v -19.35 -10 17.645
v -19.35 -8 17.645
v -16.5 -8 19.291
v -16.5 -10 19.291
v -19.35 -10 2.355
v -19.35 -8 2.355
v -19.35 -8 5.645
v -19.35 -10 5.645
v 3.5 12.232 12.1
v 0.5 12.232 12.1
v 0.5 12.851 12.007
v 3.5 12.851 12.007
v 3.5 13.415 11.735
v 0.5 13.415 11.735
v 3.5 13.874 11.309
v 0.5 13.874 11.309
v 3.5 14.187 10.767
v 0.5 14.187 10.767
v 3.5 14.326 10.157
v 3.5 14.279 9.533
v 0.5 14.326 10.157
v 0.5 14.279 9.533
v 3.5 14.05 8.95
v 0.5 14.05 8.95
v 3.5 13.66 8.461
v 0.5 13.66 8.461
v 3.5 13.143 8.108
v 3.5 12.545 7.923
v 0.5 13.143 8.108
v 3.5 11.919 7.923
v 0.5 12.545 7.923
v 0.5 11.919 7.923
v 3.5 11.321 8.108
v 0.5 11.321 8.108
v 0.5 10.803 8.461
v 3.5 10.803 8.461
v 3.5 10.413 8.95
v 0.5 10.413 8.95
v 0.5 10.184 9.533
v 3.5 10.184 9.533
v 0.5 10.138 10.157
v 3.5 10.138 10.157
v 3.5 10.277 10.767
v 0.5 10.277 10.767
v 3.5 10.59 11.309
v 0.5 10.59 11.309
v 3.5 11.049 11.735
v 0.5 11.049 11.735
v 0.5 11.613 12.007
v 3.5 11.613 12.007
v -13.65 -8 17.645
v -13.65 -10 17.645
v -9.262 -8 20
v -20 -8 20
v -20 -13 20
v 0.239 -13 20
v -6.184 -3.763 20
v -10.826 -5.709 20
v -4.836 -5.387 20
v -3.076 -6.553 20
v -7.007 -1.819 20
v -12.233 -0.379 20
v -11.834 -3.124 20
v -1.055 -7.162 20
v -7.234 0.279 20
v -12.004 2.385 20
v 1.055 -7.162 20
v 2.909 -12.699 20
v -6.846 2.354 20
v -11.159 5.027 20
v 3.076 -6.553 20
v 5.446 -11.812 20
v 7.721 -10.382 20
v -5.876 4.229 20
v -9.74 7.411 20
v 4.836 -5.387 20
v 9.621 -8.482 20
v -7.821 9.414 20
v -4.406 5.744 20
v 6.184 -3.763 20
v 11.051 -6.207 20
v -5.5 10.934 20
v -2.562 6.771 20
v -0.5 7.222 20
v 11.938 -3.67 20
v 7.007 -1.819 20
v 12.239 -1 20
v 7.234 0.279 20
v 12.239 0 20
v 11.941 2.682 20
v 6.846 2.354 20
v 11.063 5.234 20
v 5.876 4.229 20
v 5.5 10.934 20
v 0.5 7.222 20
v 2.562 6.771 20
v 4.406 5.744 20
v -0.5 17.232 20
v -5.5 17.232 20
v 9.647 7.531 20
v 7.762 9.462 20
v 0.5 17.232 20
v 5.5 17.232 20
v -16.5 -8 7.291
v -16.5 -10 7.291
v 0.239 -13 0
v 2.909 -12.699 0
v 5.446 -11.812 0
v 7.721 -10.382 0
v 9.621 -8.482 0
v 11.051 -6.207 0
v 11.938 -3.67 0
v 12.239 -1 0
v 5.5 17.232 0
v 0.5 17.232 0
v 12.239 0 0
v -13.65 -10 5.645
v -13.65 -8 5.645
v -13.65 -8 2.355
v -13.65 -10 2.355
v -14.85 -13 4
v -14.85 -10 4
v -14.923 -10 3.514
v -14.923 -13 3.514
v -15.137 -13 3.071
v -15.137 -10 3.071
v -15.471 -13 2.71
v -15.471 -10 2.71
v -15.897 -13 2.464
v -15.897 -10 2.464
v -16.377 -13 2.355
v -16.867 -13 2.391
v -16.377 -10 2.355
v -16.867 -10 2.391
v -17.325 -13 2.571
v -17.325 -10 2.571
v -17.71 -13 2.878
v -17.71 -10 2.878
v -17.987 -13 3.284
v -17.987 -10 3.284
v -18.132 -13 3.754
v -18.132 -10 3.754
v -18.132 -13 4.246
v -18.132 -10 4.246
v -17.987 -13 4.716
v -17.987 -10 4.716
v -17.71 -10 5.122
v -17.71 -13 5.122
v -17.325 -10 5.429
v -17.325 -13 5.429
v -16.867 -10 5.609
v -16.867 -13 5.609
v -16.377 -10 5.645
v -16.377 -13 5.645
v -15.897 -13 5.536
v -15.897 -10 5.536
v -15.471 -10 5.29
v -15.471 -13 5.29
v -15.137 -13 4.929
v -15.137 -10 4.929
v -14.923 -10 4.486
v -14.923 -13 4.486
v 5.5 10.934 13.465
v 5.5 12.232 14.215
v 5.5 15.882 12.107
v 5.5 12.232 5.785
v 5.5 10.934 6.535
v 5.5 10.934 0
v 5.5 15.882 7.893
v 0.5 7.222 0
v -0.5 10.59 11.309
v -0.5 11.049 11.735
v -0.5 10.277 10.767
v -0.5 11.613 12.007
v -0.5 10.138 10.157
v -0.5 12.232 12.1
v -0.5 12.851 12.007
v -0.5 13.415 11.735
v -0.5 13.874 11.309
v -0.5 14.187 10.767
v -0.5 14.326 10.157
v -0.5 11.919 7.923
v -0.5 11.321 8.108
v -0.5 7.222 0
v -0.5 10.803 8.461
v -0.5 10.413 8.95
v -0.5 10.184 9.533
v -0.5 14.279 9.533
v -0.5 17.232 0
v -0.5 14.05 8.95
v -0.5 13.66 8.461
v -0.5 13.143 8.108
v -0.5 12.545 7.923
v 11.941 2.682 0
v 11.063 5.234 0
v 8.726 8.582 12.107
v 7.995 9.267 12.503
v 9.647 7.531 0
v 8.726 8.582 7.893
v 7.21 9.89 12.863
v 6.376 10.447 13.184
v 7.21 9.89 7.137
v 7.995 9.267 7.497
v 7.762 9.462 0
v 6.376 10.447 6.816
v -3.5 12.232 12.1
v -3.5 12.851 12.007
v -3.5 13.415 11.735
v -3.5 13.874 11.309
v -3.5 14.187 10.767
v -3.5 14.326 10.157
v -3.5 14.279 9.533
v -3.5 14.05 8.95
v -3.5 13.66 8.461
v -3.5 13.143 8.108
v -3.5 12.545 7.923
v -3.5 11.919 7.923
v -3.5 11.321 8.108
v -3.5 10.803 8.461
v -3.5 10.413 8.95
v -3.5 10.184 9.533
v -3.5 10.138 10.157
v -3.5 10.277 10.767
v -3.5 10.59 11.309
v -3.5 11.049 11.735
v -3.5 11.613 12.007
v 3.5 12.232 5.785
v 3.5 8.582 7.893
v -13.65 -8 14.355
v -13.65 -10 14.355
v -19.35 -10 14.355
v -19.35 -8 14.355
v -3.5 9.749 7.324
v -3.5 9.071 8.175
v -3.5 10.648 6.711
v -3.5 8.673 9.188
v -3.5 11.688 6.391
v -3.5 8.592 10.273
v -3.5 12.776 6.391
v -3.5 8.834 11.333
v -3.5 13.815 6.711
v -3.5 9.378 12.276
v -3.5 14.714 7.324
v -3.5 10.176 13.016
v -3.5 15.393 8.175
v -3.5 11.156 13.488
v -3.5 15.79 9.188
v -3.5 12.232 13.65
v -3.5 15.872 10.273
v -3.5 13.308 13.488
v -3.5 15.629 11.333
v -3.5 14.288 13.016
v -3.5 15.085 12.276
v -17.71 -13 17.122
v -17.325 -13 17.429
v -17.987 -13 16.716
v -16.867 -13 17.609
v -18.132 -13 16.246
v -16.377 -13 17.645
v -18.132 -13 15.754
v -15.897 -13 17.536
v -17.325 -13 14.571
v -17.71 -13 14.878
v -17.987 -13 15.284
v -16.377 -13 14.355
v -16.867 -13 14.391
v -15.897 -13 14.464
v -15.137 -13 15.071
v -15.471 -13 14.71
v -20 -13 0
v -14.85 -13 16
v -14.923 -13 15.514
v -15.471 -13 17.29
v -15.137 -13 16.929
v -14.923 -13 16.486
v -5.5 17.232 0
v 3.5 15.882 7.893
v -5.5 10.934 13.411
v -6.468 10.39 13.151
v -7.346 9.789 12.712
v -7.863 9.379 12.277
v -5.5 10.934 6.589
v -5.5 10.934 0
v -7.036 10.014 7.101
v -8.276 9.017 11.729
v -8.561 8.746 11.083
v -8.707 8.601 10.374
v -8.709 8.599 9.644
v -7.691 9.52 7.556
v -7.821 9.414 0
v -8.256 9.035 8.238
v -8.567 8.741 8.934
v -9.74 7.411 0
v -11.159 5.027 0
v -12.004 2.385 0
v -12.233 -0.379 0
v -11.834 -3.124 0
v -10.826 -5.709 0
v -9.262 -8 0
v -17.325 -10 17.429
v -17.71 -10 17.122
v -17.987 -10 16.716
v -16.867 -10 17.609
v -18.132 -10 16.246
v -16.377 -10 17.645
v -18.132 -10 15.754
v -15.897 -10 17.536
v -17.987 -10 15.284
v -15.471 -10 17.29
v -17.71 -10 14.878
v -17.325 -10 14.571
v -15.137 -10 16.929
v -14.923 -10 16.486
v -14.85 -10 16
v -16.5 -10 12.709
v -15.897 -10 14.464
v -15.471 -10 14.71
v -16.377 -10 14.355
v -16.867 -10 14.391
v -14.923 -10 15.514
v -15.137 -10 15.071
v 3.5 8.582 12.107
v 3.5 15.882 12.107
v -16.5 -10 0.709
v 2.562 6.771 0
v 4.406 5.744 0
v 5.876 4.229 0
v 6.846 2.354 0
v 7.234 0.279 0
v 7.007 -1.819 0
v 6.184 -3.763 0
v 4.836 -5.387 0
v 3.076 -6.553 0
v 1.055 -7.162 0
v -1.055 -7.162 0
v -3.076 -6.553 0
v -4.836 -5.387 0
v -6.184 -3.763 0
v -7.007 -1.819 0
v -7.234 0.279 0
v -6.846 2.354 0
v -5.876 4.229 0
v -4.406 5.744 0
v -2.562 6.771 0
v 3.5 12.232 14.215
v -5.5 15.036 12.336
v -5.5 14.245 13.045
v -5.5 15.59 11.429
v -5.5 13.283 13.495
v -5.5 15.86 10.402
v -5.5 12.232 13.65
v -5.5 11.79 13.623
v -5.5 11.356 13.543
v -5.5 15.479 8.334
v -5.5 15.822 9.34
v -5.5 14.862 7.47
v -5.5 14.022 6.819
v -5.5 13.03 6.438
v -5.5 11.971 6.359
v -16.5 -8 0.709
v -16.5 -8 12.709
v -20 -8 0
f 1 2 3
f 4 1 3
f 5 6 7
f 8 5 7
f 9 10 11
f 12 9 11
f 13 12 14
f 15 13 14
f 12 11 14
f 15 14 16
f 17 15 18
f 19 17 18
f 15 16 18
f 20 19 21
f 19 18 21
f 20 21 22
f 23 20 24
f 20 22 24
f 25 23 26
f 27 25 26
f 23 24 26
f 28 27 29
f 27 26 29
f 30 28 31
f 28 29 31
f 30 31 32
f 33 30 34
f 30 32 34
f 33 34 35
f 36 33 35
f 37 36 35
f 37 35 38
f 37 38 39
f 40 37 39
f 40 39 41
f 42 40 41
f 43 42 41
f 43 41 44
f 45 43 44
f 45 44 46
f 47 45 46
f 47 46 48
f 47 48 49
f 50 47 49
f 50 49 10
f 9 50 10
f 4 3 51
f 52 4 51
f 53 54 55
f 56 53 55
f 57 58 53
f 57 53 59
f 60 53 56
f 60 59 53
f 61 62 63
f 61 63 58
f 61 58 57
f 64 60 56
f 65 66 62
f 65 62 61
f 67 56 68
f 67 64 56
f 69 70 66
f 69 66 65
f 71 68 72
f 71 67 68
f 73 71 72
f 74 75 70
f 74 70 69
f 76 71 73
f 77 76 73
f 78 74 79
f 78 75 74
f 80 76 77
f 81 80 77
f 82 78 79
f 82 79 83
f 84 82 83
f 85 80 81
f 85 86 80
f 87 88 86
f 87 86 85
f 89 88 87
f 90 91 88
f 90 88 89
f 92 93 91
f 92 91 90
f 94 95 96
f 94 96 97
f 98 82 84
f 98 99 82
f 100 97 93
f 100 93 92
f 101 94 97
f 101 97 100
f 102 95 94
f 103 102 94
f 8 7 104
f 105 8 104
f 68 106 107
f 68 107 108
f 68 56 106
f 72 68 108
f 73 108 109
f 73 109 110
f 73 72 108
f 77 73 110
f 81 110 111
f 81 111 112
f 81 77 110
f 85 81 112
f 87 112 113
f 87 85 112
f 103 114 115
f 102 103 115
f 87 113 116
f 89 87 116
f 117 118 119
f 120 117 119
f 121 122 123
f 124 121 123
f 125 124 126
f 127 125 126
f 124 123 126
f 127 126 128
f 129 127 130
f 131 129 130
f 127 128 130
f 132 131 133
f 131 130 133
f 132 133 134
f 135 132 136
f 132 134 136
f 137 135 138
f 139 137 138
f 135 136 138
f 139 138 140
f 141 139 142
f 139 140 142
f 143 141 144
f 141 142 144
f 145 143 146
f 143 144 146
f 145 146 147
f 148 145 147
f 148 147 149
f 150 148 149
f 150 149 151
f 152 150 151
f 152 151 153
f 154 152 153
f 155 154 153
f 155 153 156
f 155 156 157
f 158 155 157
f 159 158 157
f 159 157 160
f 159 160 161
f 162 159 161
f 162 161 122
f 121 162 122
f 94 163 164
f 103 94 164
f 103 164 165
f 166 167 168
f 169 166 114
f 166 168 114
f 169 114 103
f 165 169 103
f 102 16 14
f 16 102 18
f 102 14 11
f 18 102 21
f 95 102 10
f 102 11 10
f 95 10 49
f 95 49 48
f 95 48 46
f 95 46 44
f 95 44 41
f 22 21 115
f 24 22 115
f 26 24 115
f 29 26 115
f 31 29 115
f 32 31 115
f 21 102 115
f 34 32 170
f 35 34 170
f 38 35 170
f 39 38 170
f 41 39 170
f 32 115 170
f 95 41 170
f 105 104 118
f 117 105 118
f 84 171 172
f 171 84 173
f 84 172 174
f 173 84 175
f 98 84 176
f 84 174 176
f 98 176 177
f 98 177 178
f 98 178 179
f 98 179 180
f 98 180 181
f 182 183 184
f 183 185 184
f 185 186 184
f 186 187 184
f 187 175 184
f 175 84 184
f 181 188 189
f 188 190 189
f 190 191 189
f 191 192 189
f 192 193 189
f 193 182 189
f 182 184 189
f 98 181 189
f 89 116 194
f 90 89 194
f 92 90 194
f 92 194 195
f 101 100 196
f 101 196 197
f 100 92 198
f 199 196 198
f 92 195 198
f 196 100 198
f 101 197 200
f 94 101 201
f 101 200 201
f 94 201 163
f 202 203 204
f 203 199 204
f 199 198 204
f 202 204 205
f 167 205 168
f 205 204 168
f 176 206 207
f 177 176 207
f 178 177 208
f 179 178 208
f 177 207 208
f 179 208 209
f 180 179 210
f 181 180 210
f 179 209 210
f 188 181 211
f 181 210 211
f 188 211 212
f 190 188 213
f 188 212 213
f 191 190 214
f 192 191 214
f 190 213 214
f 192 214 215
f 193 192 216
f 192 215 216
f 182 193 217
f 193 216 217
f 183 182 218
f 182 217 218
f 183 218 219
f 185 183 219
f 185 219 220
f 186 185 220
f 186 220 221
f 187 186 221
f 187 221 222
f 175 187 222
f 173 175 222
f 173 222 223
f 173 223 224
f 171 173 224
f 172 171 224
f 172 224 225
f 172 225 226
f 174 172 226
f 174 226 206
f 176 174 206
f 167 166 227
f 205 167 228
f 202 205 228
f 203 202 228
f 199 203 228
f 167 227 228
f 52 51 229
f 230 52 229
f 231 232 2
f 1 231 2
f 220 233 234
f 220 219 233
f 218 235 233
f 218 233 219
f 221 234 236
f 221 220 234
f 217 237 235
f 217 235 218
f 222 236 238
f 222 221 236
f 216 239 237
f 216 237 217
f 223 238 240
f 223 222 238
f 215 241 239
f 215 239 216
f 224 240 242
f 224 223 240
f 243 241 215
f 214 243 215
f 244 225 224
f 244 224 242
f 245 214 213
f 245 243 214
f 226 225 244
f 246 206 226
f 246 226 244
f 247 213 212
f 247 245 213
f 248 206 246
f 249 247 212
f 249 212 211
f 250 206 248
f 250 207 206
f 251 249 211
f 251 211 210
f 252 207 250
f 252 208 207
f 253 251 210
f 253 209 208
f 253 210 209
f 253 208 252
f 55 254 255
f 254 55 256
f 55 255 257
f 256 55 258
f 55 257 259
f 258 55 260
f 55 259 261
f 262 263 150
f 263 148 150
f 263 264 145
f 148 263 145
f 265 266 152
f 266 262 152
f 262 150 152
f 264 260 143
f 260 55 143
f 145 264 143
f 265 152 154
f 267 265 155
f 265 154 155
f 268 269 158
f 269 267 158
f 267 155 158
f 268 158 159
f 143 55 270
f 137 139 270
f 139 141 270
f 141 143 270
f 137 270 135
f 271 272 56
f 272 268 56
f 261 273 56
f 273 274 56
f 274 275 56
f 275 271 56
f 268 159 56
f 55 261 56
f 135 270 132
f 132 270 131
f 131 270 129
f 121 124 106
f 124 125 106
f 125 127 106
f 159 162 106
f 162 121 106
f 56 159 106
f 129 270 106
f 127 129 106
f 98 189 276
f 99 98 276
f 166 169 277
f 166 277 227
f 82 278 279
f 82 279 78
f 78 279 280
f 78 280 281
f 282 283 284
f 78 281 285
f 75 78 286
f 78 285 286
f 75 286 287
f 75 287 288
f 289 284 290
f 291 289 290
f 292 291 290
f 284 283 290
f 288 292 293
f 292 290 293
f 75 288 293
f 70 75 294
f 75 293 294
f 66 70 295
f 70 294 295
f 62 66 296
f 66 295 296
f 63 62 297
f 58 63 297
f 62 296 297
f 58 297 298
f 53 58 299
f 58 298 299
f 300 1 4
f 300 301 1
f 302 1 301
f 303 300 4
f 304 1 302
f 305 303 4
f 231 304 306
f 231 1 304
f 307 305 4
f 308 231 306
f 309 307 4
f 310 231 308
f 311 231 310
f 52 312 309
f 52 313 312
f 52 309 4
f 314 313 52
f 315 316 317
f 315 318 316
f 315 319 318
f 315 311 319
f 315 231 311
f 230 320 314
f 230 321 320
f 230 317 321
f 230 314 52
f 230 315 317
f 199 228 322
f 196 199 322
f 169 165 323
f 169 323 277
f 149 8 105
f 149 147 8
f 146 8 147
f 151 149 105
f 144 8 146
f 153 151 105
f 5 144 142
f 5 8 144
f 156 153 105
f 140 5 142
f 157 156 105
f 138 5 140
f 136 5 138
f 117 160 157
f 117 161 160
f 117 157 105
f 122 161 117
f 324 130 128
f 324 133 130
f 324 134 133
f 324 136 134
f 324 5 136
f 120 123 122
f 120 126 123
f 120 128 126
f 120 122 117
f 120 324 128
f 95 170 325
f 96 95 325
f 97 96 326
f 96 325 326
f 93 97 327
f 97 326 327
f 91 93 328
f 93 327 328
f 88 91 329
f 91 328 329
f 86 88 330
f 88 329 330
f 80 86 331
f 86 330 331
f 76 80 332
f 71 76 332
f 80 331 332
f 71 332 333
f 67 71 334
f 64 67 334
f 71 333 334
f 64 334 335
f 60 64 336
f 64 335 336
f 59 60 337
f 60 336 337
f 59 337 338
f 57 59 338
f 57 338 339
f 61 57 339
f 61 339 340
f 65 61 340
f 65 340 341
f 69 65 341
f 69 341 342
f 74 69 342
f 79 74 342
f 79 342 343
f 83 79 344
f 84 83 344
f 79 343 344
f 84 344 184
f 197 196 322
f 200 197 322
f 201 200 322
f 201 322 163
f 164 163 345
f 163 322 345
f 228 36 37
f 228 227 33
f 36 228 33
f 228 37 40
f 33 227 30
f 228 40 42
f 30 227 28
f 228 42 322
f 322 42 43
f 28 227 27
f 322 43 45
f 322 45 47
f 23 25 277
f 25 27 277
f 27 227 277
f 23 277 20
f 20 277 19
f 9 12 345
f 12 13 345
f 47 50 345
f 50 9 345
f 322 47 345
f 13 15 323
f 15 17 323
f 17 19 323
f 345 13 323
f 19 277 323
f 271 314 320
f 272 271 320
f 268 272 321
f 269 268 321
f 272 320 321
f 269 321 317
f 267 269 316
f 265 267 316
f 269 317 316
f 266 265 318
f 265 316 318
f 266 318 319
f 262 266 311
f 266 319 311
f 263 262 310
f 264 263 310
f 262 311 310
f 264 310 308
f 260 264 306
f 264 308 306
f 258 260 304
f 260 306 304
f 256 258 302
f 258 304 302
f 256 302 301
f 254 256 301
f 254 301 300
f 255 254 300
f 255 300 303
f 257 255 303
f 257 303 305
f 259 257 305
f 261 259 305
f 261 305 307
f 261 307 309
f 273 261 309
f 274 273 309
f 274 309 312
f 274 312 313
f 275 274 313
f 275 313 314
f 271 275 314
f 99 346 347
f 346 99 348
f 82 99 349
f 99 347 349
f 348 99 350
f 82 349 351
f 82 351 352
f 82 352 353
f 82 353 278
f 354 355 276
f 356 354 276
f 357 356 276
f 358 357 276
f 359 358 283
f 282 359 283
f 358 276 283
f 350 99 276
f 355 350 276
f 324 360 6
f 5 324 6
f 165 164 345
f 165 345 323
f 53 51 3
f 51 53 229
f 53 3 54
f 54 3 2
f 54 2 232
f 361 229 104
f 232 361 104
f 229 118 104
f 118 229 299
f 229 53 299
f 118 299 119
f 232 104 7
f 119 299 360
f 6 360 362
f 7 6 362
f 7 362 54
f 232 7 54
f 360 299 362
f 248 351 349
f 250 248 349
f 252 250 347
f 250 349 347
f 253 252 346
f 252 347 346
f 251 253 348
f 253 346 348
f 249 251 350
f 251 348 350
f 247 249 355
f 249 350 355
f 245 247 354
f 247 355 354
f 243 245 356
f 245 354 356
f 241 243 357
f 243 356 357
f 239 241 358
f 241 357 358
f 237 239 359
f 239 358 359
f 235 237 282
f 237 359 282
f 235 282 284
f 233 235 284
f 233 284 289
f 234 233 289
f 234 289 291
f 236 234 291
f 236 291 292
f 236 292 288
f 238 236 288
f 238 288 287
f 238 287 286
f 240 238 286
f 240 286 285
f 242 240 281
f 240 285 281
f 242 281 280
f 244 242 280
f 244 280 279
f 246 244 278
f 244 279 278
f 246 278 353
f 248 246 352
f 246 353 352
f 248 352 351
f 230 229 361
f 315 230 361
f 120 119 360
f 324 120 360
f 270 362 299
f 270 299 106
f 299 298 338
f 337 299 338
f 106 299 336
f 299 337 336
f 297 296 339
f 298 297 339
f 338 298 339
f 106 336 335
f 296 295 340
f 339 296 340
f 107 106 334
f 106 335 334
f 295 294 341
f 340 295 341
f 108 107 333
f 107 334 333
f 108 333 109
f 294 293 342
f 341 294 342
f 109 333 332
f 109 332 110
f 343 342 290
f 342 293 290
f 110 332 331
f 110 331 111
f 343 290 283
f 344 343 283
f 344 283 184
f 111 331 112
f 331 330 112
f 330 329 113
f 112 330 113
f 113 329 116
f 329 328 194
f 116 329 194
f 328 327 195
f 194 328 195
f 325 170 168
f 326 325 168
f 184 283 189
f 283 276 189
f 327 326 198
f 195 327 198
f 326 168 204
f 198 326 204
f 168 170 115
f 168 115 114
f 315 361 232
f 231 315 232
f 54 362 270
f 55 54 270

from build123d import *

# Parameters (mm, degrees)
BOSS_EXTRUDE1_DEPTH     = 20
SKETCH2_R               = 2.1
CUT_EXTRUDE1_DEPTH      = 15.5
CUT_EXTRUDE1_DEPTH_BACK = 18.739
SKETCH4_R               = 3.65
CUT_EXTRUDE2_DEPTH      = 15.5
CUT_EXTRUDE2_DEPTH_BACK = 2
CUT_EXTRUDE3_DEPTH      = 7.7390001
CUT_EXTRUDE3_DEPTH_BACK = 2
SKETCH6_R               = 1.65
CUT_EXTRUDE4_DEPTH      = 6
CUT_EXTRUDE5_DEPTH      = 2
FILLET1_R               = 12


with BuildPart() as part:
    # Sketch1 → Boss-Extrude1 (new body)
    with BuildSketch(Plane.XY):
        with BuildLine():
            Line((-0.5, 7.221711778), (-0.5, 17.231747474))
            Line((-0.5, 17.231747474), (-5.5, 17.231747474))
            Line((-5.5, 17.231747474), (-5.5, 10.933577685))
            ThreePointArc((-5.5, 10.933577685), (-12.004275475, 2.385475074), (-9.262457611, -8))
            Line((-9.262457611, -8), (-20, -8))
            Line((-20, -8), (-20, -13))
            Line((-20, -13), (12.239, -13))
            Line((12.239, -13), (12.239, 0))
            ThreePointArc((12.239, 0), (10.418915994, 6.421784059), (5.5, 10.933577685))
            Line((5.5, 10.933577685), (5.5, 17.231747474))
            Line((5.5, 17.231747474), (0.5, 17.231747474))
            Line((0.5, 17.231747474), (0.5, 7.221711778))
            ThreePointArc((0.5, 7.221711778), (0, -7.239), (-0.5, 7.221711778))
        make_face()
    extrude(amount=BOSS_EXTRUDE1_DEPTH)

    # Sketch2 → Cut-Extrude1 (cut, two sides)
    with BuildSketch(Plane.ZY.offset(5.5)) as cut_extrude1_sk:
        with Locations((10, 12.231747474)):
            Circle(SKETCH2_R)
    extrude(amount=CUT_EXTRUDE1_DEPTH, mode=Mode.SUBTRACT)
    extrude(cut_extrude1_sk.sketch, amount=-CUT_EXTRUDE1_DEPTH_BACK, mode=Mode.SUBTRACT)

    # Sketch4 → Cut-Extrude2 (cut, two sides)
    with BuildSketch(Plane.ZY.offset(5.5)) as cut_extrude2_sk:
        with Locations((10, 12.231747474)):
            Circle(SKETCH4_R)
    extrude(amount=CUT_EXTRUDE2_DEPTH, mode=Mode.SUBTRACT)
    extrude(cut_extrude2_sk.sketch, amount=-CUT_EXTRUDE2_DEPTH_BACK, mode=Mode.SUBTRACT)

    # Sketch5 → Cut-Extrude3 (cut, two sides)
    with BuildSketch(Plane(origin=(5.5, 0, 0), x_dir=(0, 0, -1), z_dir=(1, 0, 0))) as cut_extrude3_sk:
        Polygon((-12.107328483, 8.581747474), (-14.214656965, 12.231747474), (-12.107328483, 15.881747474), (-7.892671517, 15.881747474), (-5.785343035, 12.231747474), (-7.892671517, 8.581747474), align=None)
    extrude(amount=CUT_EXTRUDE3_DEPTH, mode=Mode.SUBTRACT)
    extrude(cut_extrude3_sk.sketch, amount=-CUT_EXTRUDE3_DEPTH_BACK, mode=Mode.SUBTRACT)

    # Sketch6 → Cut-Extrude4 (cut, through all)
    with BuildSketch(Plane(origin=(0, -8, 0), x_dir=(1, 0, 0), z_dir=(0, 1, 0))):
        with Locations((-16.5, -4)):
            Circle(SKETCH6_R)
        with Locations((-16.5, -16)):
            Circle(SKETCH6_R)
    extrude(amount=-CUT_EXTRUDE4_DEPTH, mode=Mode.SUBTRACT)

    # Sketch7 → Cut-Extrude5 (cut)
    with BuildSketch(Plane(origin=(0, -8, 0), x_dir=(1, 0, 0), z_dir=(0, 1, 0))):
        Polygon((-16.5, -7.290896534), (-13.65, -5.645448267), (-13.65, -2.354551733), (-16.5, -0.709103466), (-19.35, -2.354551733), (-19.35, -5.645448267), align=None)
        Polygon((-16.5, -12.709103466), (-19.35, -14.354551733), (-19.35, -17.645448267), (-16.5, -19.290896534), (-13.65, -17.645448267), (-13.65, -14.354551733), align=None)
    extrude(amount=-CUT_EXTRUDE5_DEPTH, mode=Mode.SUBTRACT)

    # Fillet1
    fillet1_edges = [part.edges().sort_by_distance(p)[0] for p in [
        (12.239, -13, 10),
    ]]
    fillet(fillet1_edges, radius=FILLET1_R)


solid = part.part
